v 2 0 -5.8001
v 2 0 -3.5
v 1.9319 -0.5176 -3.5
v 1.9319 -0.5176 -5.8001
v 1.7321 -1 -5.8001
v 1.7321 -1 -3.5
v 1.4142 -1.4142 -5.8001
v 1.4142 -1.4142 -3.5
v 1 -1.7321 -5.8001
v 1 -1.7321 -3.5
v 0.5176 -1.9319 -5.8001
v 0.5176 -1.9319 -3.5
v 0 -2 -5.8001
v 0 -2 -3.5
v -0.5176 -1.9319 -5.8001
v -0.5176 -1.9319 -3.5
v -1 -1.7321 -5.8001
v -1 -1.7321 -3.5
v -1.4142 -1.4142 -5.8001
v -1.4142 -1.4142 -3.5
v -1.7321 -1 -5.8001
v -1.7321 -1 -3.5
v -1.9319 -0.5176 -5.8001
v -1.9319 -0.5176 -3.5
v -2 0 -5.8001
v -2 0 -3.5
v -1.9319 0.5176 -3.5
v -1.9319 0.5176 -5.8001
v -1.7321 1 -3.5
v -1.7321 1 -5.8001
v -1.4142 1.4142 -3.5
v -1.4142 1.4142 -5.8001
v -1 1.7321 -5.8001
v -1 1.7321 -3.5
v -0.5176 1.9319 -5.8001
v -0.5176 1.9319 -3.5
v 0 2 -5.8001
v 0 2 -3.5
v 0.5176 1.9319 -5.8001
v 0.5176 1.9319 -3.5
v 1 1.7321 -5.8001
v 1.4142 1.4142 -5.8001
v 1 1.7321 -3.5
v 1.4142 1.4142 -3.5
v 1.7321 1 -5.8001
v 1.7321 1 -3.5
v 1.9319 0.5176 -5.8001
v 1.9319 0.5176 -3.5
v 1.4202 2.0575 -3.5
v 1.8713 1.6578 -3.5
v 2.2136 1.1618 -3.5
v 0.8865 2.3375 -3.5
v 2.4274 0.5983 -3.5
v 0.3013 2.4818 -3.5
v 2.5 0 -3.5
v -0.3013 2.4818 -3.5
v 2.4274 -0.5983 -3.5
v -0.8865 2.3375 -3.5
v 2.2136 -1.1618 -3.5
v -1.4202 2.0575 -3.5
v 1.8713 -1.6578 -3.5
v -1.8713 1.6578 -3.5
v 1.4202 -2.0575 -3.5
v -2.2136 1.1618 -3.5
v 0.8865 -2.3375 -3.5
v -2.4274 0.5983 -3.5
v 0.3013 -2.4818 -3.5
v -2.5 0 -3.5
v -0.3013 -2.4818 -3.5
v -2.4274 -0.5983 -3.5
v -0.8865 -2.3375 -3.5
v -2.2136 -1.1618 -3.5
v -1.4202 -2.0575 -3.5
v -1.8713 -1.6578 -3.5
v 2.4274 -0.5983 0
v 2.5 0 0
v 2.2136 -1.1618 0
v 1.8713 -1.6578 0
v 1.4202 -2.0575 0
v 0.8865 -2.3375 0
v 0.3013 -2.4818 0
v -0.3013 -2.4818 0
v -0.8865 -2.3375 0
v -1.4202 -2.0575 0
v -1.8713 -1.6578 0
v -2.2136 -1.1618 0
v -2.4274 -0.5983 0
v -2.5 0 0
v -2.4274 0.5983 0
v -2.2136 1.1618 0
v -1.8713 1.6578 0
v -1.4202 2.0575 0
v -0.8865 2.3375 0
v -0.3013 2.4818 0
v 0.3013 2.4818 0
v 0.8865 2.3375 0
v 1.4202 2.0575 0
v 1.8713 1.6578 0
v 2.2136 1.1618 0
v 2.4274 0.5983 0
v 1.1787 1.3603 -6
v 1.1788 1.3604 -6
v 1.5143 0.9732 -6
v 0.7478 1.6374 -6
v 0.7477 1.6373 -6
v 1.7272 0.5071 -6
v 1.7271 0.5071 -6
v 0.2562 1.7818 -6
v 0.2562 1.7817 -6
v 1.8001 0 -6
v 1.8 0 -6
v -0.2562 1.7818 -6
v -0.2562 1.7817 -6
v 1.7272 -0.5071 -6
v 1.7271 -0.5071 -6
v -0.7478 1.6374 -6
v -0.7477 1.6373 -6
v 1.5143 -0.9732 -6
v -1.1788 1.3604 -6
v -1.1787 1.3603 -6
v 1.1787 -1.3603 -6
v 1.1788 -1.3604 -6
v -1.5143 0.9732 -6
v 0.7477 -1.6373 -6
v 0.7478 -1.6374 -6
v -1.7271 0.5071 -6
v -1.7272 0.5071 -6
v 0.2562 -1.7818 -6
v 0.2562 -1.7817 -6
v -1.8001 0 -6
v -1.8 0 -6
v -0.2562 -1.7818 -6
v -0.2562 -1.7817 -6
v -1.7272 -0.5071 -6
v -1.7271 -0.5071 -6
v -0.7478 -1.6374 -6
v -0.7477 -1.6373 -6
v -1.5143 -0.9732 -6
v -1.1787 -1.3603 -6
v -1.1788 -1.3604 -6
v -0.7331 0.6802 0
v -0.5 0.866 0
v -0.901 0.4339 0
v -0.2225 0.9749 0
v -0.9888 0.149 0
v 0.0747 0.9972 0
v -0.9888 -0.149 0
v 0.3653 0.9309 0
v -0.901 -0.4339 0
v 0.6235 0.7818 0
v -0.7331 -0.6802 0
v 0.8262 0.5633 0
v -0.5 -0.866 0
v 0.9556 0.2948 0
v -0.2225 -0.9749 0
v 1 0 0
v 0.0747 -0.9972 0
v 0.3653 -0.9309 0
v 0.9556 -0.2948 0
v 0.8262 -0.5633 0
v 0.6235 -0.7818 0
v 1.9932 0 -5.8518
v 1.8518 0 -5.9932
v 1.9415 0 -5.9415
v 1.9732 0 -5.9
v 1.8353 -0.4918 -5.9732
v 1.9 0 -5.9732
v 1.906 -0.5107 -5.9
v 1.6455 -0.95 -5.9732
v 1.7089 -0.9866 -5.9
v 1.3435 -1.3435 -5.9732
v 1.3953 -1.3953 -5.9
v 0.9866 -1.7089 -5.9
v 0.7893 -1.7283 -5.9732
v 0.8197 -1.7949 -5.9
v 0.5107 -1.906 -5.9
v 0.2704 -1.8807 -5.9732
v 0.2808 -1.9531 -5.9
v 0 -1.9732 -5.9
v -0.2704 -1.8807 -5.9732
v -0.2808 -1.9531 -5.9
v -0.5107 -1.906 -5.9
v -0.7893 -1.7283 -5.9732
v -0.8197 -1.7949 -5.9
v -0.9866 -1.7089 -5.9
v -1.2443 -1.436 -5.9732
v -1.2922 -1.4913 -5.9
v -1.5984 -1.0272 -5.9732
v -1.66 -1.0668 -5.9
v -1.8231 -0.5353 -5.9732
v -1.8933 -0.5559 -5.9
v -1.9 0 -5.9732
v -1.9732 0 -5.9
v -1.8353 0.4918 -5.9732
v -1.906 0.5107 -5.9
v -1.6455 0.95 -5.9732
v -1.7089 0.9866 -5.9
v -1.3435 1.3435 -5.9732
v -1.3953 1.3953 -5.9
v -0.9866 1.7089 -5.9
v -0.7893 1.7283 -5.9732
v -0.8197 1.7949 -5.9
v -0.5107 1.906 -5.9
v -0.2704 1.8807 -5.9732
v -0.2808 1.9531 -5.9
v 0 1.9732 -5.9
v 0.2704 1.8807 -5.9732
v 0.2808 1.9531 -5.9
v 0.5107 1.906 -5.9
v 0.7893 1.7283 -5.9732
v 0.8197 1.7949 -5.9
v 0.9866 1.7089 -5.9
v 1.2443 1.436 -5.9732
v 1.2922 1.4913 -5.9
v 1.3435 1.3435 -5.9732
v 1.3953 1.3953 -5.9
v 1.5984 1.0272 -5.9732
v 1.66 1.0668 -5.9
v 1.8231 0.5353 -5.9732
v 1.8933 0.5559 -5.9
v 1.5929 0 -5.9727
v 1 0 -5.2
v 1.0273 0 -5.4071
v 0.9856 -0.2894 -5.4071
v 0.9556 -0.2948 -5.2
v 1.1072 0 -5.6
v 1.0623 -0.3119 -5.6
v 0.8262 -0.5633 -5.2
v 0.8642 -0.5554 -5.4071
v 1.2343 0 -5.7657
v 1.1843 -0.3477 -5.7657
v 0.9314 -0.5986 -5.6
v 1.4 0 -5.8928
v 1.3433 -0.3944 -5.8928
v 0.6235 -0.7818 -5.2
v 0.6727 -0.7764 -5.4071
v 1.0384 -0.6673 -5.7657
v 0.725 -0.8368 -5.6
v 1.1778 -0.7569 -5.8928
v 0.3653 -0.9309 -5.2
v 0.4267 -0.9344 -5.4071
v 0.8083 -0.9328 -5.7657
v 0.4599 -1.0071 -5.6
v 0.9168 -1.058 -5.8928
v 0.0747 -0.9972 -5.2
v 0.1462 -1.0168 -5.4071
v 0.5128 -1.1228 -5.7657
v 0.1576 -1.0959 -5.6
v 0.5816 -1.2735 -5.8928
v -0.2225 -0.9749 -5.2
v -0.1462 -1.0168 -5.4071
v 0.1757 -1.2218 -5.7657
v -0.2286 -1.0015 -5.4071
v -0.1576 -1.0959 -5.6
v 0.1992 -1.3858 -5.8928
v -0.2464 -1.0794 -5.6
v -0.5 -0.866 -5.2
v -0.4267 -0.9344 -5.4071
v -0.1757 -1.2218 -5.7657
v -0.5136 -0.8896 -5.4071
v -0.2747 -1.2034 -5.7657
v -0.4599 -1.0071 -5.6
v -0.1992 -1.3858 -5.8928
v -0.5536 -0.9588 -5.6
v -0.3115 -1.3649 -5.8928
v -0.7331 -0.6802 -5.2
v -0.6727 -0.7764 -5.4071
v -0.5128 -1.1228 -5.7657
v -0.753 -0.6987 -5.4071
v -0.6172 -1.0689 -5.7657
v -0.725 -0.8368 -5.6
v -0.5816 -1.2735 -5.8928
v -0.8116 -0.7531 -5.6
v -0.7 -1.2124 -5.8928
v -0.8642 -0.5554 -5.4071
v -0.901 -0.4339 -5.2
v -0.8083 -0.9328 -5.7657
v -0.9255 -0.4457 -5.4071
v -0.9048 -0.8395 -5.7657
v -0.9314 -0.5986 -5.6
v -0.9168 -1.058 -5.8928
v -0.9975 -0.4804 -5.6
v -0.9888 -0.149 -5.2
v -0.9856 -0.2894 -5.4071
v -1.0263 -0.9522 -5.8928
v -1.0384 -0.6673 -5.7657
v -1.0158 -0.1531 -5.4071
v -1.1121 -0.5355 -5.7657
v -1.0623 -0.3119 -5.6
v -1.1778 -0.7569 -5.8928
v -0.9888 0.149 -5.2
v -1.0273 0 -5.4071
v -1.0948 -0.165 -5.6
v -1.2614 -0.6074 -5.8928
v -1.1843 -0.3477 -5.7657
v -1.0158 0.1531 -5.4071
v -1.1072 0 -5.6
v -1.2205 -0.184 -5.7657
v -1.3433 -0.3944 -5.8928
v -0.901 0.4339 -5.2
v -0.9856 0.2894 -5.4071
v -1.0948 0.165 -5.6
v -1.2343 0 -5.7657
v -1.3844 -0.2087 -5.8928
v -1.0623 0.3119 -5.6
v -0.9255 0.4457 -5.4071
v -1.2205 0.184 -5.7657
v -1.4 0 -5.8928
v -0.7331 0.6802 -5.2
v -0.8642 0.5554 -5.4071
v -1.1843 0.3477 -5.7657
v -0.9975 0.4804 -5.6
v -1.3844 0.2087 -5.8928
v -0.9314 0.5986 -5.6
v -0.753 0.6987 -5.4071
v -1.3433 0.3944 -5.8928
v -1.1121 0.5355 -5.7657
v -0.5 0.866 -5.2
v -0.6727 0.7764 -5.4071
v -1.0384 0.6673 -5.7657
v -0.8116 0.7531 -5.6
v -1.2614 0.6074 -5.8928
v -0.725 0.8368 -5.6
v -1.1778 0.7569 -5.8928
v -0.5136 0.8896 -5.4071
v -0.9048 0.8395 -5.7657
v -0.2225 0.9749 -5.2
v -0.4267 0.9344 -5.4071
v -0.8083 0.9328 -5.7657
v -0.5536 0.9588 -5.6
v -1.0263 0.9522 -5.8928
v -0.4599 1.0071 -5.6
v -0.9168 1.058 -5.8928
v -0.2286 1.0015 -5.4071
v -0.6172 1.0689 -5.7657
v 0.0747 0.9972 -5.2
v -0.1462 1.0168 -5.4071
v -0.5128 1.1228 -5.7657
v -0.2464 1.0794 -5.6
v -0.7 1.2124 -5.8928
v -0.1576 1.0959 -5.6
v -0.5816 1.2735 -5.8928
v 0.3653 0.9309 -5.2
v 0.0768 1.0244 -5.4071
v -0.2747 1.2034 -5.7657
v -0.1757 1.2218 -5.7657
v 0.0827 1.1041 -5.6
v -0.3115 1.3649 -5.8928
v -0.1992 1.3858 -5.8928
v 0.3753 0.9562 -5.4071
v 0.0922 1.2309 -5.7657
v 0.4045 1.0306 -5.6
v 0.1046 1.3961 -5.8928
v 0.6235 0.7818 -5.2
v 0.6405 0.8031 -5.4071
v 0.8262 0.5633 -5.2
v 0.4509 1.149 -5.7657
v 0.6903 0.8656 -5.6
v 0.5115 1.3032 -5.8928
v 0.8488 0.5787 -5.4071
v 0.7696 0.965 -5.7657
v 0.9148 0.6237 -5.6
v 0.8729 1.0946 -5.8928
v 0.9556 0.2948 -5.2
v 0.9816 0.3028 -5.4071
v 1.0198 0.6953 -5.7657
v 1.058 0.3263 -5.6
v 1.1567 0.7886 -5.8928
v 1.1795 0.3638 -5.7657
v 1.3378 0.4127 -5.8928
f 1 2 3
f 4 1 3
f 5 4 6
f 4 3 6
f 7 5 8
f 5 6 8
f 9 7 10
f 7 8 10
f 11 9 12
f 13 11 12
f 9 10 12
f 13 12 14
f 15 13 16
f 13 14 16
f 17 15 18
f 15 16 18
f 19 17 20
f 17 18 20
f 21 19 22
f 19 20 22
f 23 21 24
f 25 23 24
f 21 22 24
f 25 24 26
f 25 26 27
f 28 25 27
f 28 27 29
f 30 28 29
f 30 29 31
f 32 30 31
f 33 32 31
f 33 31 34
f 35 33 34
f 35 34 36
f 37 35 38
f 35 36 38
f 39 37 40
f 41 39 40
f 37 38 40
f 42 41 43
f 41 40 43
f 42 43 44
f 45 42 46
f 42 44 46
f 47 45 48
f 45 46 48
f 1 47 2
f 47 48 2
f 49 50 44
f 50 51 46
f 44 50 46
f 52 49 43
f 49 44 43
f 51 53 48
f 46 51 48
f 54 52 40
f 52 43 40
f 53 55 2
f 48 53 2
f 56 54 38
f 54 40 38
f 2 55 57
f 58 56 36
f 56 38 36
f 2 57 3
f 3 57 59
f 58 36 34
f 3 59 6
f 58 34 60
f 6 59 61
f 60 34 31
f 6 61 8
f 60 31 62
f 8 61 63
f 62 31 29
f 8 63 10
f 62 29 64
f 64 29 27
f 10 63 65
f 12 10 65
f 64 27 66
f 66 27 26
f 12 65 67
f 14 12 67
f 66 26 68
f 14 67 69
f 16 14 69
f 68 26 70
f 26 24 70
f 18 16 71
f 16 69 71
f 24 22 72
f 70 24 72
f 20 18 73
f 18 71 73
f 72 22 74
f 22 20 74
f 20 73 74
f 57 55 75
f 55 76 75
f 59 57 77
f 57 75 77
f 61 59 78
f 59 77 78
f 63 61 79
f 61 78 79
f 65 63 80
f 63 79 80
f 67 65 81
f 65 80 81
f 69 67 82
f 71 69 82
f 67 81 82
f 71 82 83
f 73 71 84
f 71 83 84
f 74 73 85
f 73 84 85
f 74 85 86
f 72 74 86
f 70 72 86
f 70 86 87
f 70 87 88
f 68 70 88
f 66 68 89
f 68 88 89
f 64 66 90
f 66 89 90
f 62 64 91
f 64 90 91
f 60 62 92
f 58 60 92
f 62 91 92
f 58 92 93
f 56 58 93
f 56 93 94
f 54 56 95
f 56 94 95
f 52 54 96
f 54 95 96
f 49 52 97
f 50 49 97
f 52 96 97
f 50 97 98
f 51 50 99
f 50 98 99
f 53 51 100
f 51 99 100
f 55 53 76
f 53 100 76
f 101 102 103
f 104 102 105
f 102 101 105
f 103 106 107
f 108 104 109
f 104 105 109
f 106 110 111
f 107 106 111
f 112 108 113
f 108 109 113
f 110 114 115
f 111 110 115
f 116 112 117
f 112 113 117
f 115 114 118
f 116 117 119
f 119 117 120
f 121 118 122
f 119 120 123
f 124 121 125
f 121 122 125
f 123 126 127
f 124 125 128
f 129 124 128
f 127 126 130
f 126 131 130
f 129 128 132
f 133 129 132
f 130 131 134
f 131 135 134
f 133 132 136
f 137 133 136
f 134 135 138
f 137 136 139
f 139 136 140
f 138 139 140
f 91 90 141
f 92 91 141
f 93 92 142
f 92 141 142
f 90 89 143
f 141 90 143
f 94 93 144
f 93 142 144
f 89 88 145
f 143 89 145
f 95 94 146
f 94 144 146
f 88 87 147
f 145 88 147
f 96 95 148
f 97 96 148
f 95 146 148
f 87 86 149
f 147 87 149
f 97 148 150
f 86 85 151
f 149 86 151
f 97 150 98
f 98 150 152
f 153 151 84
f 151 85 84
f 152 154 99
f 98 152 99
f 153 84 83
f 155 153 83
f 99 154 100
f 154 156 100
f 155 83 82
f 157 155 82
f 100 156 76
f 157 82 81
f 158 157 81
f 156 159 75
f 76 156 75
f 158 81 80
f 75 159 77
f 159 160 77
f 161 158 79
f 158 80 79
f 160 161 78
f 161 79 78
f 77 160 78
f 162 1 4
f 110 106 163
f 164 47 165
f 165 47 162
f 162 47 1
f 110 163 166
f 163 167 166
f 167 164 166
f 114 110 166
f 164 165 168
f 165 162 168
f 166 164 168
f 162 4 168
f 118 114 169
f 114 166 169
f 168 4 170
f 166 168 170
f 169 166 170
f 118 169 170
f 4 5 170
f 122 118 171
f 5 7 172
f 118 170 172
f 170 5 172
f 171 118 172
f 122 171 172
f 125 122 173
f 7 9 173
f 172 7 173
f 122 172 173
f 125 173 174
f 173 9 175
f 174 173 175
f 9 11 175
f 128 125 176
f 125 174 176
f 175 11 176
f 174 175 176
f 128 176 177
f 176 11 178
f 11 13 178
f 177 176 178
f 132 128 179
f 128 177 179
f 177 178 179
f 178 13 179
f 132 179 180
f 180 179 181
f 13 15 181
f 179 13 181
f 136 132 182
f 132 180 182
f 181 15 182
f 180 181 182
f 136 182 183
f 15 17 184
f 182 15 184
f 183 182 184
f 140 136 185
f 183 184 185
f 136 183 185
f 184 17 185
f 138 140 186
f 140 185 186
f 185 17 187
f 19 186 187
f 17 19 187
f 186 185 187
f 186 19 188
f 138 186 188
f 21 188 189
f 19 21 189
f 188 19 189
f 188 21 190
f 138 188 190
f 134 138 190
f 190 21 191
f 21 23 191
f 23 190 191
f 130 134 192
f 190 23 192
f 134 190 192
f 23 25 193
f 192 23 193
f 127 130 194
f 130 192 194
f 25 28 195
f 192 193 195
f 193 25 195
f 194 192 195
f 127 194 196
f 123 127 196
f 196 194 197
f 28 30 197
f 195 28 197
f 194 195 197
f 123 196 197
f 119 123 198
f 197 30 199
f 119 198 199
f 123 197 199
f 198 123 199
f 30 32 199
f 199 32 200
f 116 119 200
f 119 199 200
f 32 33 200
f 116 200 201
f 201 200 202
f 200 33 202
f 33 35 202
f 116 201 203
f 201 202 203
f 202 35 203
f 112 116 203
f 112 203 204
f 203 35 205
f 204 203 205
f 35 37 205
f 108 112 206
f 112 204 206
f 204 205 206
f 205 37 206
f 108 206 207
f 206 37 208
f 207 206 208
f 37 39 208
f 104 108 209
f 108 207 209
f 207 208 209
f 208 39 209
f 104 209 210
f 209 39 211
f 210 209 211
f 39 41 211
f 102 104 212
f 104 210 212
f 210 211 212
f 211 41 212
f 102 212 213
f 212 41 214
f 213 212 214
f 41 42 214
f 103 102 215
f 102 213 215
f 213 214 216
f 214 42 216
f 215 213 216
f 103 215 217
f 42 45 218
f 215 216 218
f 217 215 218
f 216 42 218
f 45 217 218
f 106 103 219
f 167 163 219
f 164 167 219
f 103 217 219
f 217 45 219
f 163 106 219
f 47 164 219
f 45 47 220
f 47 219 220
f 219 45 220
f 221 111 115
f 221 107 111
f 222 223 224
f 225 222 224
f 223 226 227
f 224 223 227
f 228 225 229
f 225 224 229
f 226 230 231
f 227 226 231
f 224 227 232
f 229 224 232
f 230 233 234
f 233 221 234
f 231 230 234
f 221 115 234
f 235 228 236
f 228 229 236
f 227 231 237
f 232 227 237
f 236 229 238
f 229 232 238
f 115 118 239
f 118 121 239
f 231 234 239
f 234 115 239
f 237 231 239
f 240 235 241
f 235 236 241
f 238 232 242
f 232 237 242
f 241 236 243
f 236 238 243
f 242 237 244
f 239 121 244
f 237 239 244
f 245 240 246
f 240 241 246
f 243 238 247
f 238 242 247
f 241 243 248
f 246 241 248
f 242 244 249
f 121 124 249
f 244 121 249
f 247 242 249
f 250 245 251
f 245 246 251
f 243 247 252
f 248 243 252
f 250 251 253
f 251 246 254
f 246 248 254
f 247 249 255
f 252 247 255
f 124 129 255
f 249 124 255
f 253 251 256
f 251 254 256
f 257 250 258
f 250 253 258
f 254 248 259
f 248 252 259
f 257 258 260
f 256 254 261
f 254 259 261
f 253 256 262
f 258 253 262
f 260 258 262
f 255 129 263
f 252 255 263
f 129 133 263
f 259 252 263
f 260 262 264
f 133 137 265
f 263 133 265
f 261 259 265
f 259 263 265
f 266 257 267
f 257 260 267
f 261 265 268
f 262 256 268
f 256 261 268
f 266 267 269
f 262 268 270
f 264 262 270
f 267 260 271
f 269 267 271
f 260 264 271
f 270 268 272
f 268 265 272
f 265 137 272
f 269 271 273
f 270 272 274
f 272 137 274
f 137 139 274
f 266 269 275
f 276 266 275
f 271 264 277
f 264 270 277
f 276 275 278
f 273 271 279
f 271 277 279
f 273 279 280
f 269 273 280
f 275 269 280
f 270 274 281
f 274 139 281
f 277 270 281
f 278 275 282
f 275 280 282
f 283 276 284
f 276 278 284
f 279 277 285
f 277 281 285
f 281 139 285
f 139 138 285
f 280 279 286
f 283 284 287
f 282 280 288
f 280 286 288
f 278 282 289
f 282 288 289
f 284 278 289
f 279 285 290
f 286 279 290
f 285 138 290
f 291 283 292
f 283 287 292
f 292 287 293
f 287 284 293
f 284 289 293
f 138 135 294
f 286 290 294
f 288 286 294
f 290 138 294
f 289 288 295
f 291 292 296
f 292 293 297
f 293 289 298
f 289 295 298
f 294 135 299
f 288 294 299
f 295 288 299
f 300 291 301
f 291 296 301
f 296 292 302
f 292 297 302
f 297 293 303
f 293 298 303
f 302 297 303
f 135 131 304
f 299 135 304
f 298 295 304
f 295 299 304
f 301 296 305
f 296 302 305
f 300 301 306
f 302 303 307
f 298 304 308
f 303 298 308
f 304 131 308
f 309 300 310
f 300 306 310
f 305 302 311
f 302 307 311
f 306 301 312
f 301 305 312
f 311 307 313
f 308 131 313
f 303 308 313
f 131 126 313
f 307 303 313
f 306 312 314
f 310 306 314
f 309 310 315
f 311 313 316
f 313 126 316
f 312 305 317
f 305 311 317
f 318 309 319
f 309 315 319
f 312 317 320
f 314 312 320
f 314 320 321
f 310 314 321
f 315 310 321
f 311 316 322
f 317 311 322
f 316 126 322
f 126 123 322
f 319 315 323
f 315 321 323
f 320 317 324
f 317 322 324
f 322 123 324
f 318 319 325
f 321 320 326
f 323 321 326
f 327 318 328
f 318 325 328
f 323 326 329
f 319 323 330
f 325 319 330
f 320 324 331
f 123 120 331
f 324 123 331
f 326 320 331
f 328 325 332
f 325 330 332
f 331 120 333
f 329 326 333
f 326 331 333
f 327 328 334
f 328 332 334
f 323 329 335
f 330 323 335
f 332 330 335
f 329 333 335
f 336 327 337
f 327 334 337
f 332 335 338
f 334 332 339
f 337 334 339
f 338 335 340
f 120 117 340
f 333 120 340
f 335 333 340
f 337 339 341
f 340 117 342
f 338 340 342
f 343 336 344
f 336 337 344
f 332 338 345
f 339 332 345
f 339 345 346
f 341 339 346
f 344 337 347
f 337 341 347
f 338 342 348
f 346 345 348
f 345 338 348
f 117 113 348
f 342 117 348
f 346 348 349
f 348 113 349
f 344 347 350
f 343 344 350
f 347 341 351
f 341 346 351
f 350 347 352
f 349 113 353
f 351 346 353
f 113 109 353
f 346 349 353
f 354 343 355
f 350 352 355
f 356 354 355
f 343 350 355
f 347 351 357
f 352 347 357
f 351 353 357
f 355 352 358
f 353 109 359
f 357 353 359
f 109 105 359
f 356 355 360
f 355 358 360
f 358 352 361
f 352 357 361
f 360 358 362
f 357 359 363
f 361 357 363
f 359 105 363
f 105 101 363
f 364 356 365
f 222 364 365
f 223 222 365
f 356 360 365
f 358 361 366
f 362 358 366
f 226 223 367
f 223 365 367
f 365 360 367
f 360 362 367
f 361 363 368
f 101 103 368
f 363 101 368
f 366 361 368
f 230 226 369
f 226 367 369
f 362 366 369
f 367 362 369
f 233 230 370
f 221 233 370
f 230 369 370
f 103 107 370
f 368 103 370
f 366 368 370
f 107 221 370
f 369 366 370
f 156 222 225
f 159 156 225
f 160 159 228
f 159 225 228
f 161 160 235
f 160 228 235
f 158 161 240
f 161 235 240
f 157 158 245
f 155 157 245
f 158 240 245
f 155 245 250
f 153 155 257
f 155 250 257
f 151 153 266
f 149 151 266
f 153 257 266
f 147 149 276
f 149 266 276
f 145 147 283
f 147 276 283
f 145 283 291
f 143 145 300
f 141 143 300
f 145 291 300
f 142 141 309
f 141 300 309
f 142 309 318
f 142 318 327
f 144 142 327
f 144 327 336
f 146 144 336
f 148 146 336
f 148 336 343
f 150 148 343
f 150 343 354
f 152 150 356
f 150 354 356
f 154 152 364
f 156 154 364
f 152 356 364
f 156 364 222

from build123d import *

# Parameters (mm, degrees)
VERRUNDUNG1_R = 0.8
VERRUNDUNG2_R = 0.2


with BuildPart() as part:
    # Skizze1 → Rotation1 (revolve)
    with BuildSketch(Plane(origin=(0, 0, 0), x_dir=(0, 0, -1), z_dir=(1, 0, 0)), mode=Mode.PRIVATE) as rotation1_sk:
        Polygon((0, 2.5), (0, 1), (6, 1), (6, 2), (3.5, 2), (3.5, 2.5), align=None)
    revolve(rotation1_sk.sketch.rotate(Axis((0, 0, 0), (0, 0, -1)), 90), axis=Axis((0, 0, 0), (0, 0, -1)))

    # Verrundung1
    verrundung1_edges = [part.edges().sort_by_distance(p)[0] for p in [
        (-1, 0, -6),
    ]]
    fillet(verrundung1_edges, radius=VERRUNDUNG1_R)

    # Verrundung2
    verrundung2_edges = [part.edges().sort_by_distance(p)[0] for p in [
        (-2, 0, -6),
    ]]
    fillet(verrundung2_edges, radius=VERRUNDUNG2_R - 0.0001)  # a hair under: the kernel refuses the full size


solid = part.part
